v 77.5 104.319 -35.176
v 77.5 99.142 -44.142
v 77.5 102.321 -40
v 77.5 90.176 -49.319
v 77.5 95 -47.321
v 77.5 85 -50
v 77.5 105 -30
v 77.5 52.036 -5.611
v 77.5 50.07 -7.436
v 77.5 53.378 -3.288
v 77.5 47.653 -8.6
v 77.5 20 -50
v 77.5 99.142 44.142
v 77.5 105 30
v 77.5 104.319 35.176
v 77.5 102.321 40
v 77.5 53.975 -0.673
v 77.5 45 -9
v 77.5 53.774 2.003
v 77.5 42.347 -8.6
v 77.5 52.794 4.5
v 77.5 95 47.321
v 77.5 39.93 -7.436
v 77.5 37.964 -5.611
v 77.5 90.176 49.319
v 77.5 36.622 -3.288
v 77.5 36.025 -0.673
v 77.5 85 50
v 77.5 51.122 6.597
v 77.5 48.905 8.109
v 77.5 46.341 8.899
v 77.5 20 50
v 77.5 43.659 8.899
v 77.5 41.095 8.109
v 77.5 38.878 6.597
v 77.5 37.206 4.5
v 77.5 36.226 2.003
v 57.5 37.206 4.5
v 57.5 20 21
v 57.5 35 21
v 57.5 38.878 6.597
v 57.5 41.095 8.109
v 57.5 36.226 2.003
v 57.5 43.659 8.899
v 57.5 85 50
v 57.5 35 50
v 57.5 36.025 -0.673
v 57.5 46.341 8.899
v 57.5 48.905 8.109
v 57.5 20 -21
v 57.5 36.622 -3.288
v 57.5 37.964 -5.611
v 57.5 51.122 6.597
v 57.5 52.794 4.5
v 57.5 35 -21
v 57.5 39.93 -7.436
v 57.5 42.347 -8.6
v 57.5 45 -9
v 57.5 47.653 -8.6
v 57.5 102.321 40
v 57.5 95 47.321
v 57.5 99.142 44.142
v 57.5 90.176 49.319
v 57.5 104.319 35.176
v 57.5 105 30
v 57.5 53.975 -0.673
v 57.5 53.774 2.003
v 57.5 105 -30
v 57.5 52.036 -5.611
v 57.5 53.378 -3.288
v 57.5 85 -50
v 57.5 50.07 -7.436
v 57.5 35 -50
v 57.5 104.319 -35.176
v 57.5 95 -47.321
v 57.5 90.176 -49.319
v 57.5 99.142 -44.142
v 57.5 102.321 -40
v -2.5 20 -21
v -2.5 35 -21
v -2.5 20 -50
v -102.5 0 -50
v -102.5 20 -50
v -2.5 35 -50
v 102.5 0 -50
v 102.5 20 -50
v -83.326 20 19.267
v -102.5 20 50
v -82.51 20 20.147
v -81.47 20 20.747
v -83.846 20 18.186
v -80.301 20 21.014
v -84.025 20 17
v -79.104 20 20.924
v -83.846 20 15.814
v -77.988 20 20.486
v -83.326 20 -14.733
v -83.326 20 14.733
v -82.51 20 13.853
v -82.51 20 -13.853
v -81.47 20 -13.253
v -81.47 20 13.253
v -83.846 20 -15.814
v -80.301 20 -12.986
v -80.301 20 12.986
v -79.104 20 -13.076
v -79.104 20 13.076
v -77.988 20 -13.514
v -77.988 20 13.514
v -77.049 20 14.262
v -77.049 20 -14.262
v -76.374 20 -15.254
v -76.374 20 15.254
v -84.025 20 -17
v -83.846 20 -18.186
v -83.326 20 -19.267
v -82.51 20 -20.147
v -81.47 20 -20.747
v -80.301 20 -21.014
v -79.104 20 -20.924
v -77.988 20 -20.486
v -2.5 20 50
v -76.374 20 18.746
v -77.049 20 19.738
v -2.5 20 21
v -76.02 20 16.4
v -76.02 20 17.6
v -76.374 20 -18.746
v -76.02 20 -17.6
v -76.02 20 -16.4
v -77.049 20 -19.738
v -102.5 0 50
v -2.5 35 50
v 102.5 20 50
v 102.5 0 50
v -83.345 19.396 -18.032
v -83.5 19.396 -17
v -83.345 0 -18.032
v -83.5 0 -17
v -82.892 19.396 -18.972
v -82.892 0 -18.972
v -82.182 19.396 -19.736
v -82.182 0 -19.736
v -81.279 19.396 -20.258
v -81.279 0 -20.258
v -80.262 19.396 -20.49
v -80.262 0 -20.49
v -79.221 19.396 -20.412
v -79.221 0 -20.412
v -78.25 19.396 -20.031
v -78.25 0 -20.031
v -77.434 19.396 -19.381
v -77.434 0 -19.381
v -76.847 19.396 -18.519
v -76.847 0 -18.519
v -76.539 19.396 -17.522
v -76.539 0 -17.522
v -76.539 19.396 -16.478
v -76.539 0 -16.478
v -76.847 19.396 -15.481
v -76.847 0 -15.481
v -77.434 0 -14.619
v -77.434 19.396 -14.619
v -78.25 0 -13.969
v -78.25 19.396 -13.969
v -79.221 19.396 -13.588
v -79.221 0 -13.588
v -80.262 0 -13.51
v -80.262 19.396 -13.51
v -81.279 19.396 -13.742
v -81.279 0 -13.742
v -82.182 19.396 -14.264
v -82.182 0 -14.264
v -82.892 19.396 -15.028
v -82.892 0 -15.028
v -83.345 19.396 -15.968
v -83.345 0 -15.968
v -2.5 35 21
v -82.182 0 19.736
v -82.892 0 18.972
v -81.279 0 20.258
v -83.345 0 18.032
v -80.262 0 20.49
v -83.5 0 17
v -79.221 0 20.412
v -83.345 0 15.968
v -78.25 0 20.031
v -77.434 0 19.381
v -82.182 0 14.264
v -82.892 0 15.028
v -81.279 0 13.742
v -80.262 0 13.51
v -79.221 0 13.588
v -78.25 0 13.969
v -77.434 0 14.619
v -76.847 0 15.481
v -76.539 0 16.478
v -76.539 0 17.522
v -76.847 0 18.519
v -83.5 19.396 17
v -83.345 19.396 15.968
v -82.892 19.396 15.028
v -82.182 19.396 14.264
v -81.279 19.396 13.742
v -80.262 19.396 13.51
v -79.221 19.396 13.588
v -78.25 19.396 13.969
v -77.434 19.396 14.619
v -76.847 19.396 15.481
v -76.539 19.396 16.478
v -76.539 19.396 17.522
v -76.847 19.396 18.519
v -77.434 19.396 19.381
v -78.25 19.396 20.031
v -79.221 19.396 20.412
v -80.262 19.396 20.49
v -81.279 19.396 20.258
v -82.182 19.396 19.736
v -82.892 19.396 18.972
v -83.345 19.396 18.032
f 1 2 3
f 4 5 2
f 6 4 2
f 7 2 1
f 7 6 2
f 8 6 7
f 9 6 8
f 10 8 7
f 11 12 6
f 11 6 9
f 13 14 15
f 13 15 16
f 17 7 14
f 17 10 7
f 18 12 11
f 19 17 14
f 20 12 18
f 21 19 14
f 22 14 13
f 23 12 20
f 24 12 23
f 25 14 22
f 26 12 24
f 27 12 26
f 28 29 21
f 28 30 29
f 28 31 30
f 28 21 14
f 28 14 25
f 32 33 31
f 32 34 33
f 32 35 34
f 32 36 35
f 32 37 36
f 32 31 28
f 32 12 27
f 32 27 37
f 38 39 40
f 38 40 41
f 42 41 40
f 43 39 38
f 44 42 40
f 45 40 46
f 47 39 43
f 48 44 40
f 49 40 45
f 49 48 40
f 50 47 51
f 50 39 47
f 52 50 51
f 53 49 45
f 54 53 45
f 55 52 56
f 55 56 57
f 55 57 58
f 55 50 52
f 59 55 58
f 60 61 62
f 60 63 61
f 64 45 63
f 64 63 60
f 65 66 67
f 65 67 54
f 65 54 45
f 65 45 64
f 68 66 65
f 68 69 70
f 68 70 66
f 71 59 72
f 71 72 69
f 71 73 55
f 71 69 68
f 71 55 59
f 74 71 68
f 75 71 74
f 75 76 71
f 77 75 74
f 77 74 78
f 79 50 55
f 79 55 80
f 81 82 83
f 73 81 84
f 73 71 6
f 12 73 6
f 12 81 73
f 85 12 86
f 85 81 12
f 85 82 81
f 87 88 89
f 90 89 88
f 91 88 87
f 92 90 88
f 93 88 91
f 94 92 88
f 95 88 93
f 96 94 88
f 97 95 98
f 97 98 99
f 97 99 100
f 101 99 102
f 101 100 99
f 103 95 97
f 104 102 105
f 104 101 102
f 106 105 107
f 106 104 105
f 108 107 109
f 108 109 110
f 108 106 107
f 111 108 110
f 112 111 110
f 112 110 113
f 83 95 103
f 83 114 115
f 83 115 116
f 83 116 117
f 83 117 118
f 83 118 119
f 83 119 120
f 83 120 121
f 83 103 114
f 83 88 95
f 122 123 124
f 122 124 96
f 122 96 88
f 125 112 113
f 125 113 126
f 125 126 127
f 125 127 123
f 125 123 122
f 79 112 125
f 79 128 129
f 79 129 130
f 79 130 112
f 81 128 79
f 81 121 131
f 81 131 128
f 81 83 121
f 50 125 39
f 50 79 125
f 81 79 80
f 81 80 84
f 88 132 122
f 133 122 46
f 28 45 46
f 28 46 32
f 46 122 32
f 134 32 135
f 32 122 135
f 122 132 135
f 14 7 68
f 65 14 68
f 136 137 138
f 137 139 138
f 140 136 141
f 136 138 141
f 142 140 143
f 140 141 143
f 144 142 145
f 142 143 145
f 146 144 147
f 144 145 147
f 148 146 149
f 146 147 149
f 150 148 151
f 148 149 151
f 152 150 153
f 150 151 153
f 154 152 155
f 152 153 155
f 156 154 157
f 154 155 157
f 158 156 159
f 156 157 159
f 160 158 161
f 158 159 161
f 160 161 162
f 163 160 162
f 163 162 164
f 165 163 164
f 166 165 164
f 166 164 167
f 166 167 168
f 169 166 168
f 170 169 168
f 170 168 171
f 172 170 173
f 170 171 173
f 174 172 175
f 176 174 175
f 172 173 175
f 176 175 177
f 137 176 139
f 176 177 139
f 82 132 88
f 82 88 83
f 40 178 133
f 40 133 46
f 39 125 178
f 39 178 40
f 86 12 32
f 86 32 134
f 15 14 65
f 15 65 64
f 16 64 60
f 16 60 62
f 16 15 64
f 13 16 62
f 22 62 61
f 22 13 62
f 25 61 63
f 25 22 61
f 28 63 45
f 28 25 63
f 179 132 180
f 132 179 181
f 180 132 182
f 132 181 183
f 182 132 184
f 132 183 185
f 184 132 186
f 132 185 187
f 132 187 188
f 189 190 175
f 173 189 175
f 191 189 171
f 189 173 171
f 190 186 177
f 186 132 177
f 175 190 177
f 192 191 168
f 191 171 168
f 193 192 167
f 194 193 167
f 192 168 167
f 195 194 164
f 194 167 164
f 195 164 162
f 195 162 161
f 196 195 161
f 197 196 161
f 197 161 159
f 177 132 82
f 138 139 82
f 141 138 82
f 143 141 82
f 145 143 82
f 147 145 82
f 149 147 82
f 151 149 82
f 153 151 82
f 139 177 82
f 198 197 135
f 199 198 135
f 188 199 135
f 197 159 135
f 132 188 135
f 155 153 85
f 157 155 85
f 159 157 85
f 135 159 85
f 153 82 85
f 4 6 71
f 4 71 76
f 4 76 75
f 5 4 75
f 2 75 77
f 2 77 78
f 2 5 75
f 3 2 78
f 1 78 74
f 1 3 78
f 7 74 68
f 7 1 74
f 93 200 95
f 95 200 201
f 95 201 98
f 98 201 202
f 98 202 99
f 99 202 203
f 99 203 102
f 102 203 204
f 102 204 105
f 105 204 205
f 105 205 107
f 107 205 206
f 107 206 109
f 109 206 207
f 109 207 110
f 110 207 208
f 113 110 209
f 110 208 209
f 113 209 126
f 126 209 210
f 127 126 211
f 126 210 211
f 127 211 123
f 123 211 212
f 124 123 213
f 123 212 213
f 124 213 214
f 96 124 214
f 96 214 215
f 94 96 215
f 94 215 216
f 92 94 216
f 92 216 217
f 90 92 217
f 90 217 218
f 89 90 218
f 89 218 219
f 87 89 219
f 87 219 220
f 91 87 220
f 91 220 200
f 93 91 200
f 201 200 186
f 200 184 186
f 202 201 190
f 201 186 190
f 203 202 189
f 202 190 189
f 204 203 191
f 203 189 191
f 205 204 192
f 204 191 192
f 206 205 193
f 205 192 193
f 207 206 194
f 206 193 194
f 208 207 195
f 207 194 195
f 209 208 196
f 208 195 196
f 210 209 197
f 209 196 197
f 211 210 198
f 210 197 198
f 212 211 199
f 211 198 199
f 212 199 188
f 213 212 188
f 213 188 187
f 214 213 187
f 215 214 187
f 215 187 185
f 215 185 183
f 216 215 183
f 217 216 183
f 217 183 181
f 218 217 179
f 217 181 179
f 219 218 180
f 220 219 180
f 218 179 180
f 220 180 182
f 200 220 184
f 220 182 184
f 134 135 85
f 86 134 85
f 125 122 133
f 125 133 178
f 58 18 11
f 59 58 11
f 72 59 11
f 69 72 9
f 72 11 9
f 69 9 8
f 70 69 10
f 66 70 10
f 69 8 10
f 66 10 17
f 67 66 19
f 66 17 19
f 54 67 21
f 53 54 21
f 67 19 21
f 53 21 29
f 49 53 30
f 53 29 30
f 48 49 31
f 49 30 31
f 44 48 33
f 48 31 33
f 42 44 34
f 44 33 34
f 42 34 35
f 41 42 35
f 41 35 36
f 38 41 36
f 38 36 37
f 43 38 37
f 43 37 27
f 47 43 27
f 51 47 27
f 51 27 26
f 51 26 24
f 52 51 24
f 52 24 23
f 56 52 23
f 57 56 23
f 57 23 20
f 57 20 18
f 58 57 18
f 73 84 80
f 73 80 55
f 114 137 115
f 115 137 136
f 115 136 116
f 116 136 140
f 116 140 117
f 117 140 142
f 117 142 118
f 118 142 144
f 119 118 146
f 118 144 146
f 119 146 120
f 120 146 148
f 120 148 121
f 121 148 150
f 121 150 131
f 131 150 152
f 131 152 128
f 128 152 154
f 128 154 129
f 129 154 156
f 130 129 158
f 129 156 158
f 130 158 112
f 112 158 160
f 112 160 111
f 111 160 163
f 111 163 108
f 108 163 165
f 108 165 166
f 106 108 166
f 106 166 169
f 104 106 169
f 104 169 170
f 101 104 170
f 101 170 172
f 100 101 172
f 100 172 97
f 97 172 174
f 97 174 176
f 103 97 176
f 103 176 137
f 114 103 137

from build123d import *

# Parameters (mm, degrees)
SCHIZZO1_W                          = 205
SCHIZZO1_H                          = 100
ESTRUSIONE_ESTRUSIONE1_DEPTH        = 20
ESTRUSIONE_ESTRUSIONE2_START        = 20
ESTRUSIONE_ESTRUSIONE2_DEPTH        = 85
TAGLIO_ESTRUSIONE1_DEPTH            = 156.020159979
TAGLIO_ESTRUSIONE1_DEPTH_BACK       = 156.020159979
SCHIZZO4_W                          = 60
SCHIZZO4_H                          = 70
TAGLIO_ESTRUSIONE2_START            = 77.5
SCHIZZO6_R                          = 9
TAGLIO_ESTRUSIONE2_DEPTH            = 80
FORO_FILETTATO_M8X1_0_1_D           = 7
FORO_FILETTATO_M8X1_0_1_CSINK_D     = 8.05
FORO_FILETTATO_M8X1_0_1_CSINK_ANGLE = 82


with BuildPart() as part:
    # Schizzo1 → Estrusione-Estrusione1 (new body)
    with BuildSketch(Plane(origin=(0, 0, 0), x_dir=(1, 0, 0), z_dir=(0, 1, 0))):
        Rectangle(SCHIZZO1_W, SCHIZZO1_H)
    extrude(amount=ESTRUSIONE_ESTRUSIONE1_DEPTH)

    # Schizzo2 → Estrusione-Estrusione2 (add)
    with BuildSketch(Plane(origin=(0, 0, 0), x_dir=(1, 0, 0), z_dir=(0, 1, 0)).offset(ESTRUSIONE_ESTRUSIONE2_START)):
        Polygon((77.5, 50), (77.5, -50), (-2.5, -50), (-2.5, -21), (57.5, -21), (57.5, 21), (-2.5, 21), (-2.5, 50), align=None)
    extrude(amount=ESTRUSIONE_ESTRUSIONE2_DEPTH)

    # Schizzo4 → Taglio-Estrusione1 (cut, two sides: drawn at the far end of the back side and taken through both)
    with BuildSketch(Plane.XY.offset(-TAGLIO_ESTRUSIONE1_DEPTH_BACK)):
        with Locations((27.5, 70)):
            Rectangle(SCHIZZO4_W, SCHIZZO4_H)
    extrude(amount=TAGLIO_ESTRUSIONE1_DEPTH + TAGLIO_ESTRUSIONE1_DEPTH_BACK, mode=Mode.SUBTRACT)

    # Schizzo6 → Taglio-Estrusione2 (cut)
    with BuildSketch(Plane(origin=(0, 0, 0), x_dir=(0, 0, -1), z_dir=(1, 0, 0)).offset(TAGLIO_ESTRUSIONE2_START)):
        with Locations((0, 45)):
            Circle(SCHIZZO6_R)
        with BuildLine():
            Line((-50, 85), (-50, 105))
            Line((-50, 105), (-30, 105))
            ThreePointArc((-30, 105), (-44.142135624, 99.142135624), (-50, 85))
        make_face()
        with BuildLine():
            Line((30, 105), (50, 105))
            Line((50, 105), (50, 85))
            ThreePointArc((50, 85), (44.142135624, 99.142135624), (30, 105))
        make_face()
    extrude(amount=-TAGLIO_ESTRUSIONE2_DEPTH, mode=Mode.SUBTRACT)

    # Foro filettato M8x1.0-1 (through all)
    with Locations(Plane(origin=(0, 20, 0), x_dir=(1, 0, 0), z_dir=(0, 1, 0))):
        with Locations((-80, -17), (-80, 17)):
            CounterSinkHole(FORO_FILETTATO_M8X1_0_1_D / 2, FORO_FILETTATO_M8X1_0_1_CSINK_D / 2, counter_sink_angle=FORO_FILETTATO_M8X1_0_1_CSINK_ANGLE)


solid = part.part
